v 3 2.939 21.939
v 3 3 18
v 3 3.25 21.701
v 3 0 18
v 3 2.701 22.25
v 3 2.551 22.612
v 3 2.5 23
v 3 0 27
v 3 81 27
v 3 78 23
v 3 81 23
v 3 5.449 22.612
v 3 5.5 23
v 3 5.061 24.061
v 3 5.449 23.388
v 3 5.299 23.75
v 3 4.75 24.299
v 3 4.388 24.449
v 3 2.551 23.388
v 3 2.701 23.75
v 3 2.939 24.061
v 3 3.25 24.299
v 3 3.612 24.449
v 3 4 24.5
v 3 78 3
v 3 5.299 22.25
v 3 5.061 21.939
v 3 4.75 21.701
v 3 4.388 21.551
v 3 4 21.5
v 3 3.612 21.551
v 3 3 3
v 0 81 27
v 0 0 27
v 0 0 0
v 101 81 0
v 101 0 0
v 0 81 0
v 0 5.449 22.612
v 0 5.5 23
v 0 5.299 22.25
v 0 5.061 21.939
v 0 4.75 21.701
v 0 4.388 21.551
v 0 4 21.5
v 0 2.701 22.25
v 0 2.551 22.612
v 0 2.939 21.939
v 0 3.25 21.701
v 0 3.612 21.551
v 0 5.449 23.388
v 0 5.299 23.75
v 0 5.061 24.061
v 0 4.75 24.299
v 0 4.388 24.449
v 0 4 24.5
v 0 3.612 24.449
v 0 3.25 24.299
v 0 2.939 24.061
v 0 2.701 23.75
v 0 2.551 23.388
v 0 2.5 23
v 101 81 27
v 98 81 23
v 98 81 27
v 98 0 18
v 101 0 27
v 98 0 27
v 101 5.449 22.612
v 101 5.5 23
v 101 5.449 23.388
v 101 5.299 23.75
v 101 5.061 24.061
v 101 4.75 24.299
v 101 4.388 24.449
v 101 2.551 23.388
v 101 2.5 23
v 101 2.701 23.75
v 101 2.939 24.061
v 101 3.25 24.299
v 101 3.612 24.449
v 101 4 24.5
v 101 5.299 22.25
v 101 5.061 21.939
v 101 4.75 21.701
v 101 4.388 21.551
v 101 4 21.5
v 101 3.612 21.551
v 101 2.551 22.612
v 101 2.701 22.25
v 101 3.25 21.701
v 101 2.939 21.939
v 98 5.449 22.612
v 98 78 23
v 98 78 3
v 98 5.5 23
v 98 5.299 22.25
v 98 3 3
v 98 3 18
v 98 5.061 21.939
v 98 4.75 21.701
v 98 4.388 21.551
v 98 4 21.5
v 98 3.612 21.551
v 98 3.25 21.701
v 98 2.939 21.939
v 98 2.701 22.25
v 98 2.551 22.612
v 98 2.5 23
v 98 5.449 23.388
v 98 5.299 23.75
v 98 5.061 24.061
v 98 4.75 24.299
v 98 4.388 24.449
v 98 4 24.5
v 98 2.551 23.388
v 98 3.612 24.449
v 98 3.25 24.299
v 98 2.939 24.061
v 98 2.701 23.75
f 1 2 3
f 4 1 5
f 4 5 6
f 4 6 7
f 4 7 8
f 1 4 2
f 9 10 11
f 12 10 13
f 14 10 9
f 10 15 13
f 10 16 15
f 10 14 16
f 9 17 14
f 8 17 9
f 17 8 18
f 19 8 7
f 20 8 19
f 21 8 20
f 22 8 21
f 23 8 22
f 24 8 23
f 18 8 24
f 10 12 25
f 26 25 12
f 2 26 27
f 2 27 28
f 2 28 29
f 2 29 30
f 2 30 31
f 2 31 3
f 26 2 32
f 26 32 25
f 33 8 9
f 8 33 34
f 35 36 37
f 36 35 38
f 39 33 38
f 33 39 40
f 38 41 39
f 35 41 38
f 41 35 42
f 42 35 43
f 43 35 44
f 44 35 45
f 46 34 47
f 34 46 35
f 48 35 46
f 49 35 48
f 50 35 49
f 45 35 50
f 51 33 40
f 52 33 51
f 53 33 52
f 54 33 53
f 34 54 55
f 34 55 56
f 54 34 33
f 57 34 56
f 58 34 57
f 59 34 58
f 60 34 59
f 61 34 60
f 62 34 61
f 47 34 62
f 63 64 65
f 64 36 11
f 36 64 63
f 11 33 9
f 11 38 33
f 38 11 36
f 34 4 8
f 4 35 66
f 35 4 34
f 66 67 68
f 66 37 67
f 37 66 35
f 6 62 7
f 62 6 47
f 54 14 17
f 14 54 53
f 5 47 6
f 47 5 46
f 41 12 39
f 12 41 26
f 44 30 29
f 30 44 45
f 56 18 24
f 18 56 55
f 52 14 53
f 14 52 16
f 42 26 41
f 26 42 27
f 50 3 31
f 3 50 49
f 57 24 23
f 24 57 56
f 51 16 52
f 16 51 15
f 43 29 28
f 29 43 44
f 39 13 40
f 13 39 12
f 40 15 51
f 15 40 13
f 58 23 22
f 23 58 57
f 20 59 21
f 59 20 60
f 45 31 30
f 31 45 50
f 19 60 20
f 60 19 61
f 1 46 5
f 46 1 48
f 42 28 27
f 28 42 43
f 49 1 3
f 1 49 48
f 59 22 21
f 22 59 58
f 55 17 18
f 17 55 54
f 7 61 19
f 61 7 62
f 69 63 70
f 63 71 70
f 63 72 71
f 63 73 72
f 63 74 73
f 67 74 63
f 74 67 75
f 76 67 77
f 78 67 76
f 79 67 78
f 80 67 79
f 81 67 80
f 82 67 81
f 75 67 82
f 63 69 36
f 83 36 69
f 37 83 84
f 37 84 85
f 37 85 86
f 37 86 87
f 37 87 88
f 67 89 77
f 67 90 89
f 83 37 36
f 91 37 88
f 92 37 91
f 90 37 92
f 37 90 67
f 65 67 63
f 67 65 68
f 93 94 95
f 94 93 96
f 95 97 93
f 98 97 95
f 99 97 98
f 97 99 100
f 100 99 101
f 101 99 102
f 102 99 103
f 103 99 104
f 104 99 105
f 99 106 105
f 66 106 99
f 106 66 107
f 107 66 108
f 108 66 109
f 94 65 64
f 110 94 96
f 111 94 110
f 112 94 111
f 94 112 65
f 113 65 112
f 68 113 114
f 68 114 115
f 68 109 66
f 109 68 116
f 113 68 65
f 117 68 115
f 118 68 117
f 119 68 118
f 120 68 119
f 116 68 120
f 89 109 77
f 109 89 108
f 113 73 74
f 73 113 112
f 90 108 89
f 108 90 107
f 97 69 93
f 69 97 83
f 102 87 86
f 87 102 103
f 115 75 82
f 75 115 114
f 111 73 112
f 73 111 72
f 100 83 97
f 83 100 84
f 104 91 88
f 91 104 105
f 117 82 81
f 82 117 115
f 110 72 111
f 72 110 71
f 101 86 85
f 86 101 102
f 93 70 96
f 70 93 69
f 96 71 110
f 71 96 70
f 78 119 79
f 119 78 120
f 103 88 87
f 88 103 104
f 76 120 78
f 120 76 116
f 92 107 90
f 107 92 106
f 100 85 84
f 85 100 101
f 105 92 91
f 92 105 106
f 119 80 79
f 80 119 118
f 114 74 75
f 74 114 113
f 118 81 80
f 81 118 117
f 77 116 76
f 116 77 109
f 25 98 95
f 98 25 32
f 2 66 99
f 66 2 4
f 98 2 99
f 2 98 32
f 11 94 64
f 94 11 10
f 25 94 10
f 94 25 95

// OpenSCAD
cube([95+6, 75+6, 3]);
cube([95+6, 3, 18]);
translate([0, 75+3, 0]) cube([95+6, 3, 18+5]);
difference() {
    cube([3, 75+6, 18+5+4]);
    translate([0, 4, 18+5]) rotate([0, 90, 0]) cylinder(h=3, r=1.5);
}
difference() {
    translate([95+3, 0, 0]) cube([3, 75+6, 18+5+4]);
    translate([95+3, 4, 18+5]) rotate([0, 90, 0]) cylinder(h=3, r=1.5);
}
$fa = 1;
$fs = 0.4;
